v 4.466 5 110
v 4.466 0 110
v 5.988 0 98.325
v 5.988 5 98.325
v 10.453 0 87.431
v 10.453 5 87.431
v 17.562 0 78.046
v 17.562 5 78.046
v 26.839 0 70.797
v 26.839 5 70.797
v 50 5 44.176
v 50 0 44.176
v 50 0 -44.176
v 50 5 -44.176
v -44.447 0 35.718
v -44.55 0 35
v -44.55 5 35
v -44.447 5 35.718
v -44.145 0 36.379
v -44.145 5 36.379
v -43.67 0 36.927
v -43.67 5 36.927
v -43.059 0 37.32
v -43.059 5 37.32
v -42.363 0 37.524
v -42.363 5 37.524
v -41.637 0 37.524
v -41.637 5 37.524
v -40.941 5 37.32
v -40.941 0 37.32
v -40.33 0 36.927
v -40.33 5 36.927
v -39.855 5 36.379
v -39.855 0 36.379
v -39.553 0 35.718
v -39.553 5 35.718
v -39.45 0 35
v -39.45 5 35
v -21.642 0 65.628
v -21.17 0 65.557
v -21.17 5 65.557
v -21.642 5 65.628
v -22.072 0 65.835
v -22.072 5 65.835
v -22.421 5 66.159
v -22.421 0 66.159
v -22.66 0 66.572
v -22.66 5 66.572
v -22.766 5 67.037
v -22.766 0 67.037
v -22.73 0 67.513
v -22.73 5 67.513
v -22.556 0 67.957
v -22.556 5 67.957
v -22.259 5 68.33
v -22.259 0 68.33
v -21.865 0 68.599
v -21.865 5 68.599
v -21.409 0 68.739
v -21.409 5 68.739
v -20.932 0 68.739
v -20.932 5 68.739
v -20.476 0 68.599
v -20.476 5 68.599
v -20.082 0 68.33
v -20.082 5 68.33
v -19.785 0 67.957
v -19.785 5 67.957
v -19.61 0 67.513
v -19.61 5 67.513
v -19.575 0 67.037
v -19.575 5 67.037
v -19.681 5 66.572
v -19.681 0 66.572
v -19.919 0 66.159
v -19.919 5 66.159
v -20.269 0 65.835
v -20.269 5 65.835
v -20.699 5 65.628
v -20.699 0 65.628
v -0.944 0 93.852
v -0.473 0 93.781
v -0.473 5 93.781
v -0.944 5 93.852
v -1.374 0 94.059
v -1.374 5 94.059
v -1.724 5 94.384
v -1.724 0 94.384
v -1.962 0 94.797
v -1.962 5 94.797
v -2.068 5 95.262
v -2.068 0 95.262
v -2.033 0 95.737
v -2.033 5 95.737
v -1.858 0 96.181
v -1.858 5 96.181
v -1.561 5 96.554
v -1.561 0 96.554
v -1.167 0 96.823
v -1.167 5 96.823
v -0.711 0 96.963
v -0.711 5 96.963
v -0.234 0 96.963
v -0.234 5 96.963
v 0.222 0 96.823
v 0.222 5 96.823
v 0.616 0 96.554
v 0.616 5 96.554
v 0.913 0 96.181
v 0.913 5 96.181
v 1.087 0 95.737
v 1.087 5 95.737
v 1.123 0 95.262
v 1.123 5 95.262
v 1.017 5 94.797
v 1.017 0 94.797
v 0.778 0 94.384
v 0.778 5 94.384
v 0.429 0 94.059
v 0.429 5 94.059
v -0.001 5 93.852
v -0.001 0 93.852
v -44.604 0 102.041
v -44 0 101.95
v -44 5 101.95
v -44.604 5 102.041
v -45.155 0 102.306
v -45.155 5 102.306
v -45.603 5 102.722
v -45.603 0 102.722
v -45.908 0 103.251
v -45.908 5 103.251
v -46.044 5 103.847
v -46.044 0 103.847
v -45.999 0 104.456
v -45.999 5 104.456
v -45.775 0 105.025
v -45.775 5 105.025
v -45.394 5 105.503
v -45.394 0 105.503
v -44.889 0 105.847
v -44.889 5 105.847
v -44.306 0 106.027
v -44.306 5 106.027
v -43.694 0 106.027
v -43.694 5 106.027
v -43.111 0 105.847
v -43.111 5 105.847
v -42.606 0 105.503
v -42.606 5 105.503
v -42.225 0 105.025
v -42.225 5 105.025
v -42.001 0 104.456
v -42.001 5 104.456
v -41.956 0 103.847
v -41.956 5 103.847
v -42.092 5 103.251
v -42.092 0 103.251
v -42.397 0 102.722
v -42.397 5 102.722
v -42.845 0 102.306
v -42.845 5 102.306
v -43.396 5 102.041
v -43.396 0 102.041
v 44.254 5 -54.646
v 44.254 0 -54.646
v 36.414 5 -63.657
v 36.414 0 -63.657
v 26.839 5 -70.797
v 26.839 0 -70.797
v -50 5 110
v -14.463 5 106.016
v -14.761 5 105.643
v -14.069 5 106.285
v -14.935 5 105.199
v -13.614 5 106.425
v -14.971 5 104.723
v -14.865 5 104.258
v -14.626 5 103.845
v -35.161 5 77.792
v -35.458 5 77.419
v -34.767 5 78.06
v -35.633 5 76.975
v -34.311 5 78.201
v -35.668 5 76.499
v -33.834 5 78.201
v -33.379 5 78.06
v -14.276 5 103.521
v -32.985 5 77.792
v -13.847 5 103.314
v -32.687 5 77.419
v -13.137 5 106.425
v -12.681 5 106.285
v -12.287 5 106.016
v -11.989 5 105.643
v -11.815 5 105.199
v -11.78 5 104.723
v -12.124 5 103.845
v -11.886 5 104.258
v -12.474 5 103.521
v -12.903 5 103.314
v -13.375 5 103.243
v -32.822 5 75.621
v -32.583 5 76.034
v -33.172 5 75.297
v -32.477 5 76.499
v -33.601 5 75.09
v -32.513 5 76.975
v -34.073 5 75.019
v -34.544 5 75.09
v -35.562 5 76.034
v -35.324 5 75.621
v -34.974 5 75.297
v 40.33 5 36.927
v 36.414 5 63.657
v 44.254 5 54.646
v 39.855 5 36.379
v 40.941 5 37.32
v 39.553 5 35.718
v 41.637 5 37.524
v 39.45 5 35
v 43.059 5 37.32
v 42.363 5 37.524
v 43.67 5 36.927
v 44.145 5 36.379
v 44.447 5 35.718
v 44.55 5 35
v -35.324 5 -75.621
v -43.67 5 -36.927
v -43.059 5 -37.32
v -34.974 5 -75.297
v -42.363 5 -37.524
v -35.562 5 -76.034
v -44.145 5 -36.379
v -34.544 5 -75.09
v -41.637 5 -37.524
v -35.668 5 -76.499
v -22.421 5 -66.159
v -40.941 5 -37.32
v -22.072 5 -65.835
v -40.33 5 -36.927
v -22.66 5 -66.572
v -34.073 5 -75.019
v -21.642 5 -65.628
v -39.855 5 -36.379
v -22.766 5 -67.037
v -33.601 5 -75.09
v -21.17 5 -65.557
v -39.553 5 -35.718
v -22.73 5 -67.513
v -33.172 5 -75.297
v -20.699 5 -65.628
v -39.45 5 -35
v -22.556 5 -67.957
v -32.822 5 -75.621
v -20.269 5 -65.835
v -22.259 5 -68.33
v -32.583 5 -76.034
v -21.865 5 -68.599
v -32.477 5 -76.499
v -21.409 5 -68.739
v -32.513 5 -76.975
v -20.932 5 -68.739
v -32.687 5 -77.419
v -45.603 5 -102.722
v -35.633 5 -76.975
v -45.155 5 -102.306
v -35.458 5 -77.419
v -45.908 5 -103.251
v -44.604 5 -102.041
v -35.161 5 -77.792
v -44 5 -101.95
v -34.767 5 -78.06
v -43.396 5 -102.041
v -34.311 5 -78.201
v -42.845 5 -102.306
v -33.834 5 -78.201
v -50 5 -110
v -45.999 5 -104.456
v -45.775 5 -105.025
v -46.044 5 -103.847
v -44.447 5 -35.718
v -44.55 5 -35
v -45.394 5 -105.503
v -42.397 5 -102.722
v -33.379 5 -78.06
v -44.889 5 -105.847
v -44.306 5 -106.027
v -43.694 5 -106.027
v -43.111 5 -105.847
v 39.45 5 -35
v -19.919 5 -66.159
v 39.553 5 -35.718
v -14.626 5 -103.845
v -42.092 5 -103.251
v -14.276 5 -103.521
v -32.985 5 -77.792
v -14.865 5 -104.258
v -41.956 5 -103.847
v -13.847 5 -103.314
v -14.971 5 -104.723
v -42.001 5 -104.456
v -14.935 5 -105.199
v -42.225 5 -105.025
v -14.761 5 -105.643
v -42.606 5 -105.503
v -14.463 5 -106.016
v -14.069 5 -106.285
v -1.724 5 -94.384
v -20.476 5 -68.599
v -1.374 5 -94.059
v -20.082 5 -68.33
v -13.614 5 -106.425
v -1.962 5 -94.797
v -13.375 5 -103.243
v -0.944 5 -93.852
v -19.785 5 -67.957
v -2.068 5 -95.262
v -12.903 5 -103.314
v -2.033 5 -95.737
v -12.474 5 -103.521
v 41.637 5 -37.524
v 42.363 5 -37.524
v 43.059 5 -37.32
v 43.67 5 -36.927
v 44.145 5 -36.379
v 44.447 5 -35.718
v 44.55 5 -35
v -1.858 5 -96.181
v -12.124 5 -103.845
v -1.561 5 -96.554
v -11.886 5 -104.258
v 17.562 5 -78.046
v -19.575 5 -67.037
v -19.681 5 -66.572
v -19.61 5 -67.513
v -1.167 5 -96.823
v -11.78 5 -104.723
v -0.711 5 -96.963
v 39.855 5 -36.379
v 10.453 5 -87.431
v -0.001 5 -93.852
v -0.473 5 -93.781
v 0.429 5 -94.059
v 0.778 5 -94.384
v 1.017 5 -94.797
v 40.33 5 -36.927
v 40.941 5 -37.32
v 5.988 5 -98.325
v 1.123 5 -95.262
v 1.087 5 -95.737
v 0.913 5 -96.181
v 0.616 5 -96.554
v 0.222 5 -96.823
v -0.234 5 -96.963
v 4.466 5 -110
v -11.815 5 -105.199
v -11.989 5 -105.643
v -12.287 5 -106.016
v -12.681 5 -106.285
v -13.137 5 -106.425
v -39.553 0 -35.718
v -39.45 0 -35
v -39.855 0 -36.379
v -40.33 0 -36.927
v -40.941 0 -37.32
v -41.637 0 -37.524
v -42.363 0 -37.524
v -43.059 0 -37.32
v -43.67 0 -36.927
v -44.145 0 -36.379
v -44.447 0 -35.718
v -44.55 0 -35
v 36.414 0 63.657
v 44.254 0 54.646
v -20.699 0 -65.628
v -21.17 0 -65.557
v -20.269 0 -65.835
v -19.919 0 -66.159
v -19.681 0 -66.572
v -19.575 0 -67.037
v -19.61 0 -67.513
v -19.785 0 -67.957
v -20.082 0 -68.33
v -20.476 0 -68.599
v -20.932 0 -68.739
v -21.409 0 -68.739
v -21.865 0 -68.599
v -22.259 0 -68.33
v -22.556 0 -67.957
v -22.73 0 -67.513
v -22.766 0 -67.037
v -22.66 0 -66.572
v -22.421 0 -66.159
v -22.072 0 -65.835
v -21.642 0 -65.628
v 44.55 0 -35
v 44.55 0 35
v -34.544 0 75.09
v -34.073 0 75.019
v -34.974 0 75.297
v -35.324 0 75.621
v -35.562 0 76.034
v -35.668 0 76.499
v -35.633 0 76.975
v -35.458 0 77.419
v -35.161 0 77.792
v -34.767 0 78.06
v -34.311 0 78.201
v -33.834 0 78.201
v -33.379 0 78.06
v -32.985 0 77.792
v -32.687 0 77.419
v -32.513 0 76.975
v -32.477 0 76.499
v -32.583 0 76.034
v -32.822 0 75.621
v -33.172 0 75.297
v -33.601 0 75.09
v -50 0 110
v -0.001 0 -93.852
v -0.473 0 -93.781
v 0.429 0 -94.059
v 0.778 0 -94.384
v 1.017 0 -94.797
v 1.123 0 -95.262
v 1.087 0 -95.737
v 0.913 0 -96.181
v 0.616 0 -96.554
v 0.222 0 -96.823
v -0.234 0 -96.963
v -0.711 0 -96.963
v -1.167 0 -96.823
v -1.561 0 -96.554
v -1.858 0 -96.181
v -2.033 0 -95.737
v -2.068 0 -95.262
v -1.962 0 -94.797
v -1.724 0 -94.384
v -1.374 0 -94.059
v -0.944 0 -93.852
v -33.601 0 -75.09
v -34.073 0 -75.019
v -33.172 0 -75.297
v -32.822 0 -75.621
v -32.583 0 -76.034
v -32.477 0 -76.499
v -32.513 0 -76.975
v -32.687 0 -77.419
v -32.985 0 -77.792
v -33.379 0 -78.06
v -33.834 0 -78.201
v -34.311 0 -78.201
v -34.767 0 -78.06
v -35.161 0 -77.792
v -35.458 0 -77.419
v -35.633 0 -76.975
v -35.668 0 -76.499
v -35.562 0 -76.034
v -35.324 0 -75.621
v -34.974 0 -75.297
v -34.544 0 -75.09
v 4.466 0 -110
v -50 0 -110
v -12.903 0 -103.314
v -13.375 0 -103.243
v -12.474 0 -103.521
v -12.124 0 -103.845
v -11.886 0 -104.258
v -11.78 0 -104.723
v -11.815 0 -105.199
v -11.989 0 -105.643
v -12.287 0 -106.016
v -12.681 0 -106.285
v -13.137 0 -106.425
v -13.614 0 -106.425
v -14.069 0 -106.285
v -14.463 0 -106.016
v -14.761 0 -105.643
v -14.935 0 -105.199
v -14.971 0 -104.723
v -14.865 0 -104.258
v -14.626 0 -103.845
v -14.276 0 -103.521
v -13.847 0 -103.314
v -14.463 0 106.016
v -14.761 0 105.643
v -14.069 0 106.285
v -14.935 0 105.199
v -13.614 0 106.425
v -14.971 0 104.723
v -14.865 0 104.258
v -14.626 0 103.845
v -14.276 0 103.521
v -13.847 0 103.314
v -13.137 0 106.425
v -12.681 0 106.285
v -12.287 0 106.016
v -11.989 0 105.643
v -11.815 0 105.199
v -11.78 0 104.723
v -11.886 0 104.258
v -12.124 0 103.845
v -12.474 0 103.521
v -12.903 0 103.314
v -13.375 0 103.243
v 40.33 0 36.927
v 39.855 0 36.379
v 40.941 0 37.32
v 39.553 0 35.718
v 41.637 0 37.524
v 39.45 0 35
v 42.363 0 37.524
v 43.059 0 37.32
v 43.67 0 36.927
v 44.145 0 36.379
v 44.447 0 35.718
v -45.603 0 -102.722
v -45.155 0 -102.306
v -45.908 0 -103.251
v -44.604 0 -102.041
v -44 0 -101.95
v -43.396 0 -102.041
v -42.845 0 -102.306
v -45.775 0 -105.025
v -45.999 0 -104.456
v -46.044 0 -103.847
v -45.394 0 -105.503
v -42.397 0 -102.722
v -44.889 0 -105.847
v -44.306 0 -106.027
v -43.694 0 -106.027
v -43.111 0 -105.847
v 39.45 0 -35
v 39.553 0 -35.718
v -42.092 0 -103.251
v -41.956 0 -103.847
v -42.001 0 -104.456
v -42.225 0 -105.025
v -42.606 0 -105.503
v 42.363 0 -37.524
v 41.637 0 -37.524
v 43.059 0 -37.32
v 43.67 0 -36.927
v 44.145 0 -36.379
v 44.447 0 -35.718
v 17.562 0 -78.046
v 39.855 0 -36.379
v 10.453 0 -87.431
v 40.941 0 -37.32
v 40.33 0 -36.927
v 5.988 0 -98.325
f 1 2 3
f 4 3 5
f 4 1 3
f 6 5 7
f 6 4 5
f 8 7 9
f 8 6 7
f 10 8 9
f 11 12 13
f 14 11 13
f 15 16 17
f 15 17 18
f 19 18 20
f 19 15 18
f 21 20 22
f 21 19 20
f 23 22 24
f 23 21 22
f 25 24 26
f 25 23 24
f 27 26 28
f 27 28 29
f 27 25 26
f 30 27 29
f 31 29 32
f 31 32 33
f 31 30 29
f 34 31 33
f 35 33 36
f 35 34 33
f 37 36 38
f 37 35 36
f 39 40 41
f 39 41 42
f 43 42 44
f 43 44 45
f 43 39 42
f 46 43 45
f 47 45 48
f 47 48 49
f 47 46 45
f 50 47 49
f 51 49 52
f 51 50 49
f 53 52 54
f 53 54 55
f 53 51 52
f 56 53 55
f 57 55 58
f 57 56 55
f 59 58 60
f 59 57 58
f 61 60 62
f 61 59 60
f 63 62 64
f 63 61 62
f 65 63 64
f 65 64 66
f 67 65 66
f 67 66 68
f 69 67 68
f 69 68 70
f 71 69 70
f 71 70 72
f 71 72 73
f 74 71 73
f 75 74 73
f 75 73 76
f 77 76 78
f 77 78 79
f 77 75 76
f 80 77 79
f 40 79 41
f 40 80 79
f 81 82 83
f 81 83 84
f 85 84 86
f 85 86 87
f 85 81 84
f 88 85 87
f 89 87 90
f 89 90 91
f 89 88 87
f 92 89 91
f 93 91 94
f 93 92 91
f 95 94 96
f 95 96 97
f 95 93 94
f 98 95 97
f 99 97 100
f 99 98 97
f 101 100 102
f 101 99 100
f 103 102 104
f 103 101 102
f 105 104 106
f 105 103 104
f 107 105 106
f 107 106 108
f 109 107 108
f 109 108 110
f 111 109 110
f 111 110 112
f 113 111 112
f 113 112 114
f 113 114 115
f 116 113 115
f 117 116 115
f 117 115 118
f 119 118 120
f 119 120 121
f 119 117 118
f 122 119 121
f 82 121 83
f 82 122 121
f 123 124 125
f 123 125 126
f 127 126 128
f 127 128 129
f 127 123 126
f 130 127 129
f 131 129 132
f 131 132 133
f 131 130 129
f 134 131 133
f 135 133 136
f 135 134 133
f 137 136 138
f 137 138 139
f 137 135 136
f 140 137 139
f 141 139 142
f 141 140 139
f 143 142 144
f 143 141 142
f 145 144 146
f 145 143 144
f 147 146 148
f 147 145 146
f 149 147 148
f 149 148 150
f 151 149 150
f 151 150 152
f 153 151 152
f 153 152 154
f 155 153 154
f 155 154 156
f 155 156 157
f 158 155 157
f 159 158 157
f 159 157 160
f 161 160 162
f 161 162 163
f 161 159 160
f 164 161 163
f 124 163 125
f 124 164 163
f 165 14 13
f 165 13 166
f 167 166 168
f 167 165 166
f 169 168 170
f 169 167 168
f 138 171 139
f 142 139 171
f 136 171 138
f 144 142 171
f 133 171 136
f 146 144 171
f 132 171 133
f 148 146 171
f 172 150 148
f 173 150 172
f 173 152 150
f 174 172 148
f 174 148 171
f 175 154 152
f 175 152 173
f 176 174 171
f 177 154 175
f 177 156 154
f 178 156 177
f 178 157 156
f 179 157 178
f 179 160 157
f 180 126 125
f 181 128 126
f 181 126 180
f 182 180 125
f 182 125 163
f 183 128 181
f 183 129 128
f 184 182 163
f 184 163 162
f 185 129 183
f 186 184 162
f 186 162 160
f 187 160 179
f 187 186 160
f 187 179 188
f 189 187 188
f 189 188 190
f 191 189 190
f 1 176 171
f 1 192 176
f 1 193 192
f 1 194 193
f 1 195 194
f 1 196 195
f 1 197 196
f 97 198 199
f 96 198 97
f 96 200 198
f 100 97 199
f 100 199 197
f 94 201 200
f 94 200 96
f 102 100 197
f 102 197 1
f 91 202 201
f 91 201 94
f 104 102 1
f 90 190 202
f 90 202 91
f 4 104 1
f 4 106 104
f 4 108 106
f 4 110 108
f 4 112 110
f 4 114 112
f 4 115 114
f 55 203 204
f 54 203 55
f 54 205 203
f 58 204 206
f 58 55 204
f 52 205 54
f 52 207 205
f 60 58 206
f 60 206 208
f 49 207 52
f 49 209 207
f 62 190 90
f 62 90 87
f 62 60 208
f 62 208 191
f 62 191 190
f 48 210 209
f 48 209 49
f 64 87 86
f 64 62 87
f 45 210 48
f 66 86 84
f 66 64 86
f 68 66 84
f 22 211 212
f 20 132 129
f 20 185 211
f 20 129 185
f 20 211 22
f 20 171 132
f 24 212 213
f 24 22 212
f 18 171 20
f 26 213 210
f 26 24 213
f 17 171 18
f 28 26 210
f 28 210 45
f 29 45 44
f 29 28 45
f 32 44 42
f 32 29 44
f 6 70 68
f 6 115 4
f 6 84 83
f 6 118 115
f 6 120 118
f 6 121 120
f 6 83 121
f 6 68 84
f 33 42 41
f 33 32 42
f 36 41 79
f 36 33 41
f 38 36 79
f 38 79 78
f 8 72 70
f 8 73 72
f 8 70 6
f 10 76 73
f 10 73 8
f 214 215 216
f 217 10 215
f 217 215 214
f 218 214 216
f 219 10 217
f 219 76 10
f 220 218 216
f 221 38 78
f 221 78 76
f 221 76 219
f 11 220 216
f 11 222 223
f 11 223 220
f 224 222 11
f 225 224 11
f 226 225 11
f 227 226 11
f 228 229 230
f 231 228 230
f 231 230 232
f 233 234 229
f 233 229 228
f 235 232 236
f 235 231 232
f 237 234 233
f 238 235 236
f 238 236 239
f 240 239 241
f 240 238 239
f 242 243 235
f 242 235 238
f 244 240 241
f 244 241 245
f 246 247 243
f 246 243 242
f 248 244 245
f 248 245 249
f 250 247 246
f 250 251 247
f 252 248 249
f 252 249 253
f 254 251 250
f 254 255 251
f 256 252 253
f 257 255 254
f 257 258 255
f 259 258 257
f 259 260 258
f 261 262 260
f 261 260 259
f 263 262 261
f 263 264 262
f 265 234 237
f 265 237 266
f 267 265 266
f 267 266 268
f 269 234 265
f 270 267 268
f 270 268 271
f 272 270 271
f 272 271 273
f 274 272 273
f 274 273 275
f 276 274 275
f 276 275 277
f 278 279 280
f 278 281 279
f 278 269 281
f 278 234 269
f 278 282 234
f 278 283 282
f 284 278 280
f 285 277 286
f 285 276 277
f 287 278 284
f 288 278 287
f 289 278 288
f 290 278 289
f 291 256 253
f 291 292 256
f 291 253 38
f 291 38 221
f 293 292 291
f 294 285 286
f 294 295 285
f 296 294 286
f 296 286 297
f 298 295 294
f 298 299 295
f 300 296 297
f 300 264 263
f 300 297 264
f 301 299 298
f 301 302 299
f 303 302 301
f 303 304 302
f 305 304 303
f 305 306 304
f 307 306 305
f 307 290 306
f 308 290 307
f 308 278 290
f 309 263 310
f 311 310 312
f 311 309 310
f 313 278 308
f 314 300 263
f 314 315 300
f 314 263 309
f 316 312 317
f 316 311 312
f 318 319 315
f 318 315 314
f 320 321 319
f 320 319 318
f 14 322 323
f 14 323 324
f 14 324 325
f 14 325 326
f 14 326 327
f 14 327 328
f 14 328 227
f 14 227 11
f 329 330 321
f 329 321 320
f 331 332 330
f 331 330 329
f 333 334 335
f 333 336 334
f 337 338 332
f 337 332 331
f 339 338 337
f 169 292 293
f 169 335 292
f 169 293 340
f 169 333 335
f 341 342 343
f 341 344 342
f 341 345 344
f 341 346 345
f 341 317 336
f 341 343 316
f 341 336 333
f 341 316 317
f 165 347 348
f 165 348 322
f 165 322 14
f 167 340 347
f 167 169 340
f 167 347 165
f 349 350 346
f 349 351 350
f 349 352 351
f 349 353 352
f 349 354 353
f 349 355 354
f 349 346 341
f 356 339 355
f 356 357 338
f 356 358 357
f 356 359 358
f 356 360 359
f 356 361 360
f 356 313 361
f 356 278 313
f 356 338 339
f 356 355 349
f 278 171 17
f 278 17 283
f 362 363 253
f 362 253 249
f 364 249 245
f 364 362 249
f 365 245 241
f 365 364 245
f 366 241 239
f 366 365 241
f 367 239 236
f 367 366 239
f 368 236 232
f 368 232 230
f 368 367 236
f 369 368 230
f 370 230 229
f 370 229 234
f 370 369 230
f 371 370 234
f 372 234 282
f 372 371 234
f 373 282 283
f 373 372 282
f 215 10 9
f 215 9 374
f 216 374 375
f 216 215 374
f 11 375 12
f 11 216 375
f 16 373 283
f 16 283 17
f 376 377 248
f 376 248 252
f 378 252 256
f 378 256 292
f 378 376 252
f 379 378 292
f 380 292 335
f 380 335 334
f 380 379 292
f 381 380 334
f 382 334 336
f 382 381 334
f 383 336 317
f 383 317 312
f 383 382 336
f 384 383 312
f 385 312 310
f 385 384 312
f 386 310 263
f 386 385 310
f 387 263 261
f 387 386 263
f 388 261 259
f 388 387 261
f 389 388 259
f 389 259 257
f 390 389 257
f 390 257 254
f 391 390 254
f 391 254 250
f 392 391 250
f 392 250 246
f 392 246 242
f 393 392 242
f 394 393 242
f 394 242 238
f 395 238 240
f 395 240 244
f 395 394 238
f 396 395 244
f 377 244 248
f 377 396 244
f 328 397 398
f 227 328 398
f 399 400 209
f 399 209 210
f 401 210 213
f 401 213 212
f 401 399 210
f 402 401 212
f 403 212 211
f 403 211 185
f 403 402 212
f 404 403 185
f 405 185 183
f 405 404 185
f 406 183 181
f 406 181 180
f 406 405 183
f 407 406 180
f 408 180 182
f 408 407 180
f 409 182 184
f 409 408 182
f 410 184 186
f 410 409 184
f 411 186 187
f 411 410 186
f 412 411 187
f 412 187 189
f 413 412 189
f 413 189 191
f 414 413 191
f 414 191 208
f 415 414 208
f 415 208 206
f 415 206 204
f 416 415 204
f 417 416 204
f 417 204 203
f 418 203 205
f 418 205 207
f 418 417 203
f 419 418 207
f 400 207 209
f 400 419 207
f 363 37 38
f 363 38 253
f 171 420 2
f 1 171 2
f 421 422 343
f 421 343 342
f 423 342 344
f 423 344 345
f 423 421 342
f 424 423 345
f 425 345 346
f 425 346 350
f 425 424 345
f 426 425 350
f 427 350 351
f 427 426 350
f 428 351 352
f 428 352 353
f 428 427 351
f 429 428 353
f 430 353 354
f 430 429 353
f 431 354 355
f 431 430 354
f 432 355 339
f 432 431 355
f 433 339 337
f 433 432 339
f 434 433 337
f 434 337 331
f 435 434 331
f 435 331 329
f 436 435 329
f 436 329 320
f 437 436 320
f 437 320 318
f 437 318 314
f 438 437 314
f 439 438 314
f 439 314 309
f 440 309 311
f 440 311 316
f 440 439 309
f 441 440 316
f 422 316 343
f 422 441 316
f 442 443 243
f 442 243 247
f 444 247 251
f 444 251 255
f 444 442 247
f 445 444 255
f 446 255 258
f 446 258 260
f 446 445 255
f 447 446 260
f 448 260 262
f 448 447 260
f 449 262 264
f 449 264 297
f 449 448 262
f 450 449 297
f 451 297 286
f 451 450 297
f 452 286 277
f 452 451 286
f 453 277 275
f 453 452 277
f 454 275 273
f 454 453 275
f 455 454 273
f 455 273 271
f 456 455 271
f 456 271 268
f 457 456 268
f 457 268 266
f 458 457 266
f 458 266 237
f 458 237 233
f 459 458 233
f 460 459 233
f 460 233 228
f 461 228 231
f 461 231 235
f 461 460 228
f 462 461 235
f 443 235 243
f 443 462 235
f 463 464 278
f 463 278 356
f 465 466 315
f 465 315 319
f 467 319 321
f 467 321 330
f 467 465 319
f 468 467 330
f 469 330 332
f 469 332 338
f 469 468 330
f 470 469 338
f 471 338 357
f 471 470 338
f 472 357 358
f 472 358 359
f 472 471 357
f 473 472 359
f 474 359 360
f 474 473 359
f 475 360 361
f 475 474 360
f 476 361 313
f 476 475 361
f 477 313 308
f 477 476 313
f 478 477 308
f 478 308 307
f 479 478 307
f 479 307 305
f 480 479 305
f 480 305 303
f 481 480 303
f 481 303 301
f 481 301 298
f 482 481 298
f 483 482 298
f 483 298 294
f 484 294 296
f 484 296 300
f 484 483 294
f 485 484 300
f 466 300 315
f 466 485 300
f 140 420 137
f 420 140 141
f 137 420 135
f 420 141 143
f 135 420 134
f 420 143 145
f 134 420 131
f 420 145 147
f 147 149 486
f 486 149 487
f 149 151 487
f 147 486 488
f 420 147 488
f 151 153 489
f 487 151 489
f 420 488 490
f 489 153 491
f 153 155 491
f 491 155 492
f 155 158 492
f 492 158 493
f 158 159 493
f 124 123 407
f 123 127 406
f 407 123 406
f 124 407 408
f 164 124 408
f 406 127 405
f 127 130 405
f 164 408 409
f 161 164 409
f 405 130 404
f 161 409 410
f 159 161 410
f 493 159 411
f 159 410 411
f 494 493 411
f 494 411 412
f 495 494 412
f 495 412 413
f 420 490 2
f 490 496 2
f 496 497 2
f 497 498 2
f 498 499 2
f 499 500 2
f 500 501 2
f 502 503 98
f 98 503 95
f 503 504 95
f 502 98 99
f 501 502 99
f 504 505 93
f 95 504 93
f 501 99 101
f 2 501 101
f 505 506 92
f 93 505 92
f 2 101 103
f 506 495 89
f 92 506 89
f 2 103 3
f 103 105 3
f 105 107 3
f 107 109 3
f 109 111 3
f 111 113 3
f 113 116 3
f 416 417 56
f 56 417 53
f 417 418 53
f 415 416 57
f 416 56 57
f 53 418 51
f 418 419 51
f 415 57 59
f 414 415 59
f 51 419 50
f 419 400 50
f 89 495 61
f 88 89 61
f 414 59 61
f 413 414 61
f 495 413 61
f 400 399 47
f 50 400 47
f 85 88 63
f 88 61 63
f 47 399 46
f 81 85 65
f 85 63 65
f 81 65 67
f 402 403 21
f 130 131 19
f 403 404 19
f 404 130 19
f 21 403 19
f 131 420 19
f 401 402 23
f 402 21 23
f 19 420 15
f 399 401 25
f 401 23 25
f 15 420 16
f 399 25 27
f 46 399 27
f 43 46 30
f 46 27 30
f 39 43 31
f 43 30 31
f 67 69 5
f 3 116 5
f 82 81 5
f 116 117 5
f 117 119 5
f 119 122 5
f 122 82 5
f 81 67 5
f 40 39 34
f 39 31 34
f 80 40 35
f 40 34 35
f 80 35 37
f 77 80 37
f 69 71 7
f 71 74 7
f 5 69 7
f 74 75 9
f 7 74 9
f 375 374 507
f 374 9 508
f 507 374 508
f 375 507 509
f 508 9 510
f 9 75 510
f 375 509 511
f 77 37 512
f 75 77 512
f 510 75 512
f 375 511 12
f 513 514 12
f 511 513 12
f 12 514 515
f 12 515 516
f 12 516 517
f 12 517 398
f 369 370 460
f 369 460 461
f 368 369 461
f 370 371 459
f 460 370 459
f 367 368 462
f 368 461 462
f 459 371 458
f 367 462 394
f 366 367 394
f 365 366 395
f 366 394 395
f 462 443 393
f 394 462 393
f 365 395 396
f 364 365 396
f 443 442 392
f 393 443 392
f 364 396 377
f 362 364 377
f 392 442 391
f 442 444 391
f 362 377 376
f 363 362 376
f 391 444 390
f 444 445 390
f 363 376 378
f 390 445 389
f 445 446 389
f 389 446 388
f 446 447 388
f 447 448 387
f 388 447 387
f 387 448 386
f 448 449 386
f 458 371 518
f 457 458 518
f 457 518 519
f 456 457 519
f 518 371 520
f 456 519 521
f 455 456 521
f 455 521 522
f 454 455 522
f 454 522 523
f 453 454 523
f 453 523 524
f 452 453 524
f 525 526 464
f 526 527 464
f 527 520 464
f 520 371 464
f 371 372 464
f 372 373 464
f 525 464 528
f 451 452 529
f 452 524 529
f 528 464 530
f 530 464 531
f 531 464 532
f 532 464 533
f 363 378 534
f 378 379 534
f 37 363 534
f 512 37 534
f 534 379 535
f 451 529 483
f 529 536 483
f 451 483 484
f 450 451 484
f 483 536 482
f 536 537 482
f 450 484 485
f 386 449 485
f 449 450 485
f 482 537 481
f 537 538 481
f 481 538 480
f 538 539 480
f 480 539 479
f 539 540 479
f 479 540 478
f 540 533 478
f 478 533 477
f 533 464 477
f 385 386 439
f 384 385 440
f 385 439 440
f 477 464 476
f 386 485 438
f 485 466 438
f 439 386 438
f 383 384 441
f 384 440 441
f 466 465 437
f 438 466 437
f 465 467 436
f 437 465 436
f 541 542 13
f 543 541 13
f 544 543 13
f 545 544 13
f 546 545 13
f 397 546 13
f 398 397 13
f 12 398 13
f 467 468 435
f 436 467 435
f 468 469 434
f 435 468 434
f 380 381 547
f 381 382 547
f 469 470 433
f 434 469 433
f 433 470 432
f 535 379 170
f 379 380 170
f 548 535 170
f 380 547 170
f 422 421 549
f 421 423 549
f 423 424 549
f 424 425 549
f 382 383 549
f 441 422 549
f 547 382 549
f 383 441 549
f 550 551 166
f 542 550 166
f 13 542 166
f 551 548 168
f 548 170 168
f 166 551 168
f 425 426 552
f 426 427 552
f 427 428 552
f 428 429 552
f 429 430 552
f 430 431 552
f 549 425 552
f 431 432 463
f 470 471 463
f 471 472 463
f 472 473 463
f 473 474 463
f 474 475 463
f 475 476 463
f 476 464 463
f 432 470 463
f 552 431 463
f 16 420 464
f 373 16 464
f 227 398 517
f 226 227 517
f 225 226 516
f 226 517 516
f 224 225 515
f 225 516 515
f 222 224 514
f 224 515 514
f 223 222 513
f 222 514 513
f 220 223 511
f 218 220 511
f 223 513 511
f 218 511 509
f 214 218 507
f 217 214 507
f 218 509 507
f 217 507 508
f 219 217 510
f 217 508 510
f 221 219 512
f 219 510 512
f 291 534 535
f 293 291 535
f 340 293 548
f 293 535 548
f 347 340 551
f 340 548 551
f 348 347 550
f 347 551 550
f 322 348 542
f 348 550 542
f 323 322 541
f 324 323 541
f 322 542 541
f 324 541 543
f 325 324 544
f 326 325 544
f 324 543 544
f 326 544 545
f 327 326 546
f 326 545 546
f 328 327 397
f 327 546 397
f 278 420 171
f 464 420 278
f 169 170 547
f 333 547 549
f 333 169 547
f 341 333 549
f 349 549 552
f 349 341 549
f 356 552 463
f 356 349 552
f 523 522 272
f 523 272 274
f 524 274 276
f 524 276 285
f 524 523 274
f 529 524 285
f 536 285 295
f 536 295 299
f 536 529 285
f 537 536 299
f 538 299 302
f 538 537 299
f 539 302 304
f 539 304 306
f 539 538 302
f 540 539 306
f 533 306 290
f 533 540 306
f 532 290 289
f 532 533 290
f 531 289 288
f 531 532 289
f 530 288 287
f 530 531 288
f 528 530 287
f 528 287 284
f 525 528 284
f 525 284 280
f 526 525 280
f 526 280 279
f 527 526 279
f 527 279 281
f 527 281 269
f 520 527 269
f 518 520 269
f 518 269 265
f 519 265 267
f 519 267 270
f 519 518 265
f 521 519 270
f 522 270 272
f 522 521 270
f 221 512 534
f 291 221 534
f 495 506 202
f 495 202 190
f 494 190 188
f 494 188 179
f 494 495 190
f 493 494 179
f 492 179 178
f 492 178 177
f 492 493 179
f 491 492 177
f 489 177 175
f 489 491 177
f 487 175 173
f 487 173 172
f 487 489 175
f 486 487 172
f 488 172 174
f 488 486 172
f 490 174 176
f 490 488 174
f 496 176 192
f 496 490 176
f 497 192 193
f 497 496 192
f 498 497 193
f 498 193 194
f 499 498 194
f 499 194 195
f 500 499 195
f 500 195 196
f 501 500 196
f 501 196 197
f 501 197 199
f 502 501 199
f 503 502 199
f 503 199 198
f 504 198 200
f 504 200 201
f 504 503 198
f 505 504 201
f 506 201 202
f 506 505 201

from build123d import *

# Parameters (mm, degrees)
SKETCH1_W           = 100
SKETCH1_H           = 220
SKETCH1_R           = 2.05
SKETCH1_R_2         = 1.6
BOSS_EXTRUDE1_DEPTH = 5
CUT_EXTRUDE1_DEPTH  = 10


with BuildPart() as part:
    # Sketch1 → Boss-Extrude1 (new body)
    with BuildSketch(Plane(origin=(0, 0, 0), x_dir=(1, 0, 0), z_dir=(0, 1, 0))):
        Rectangle(SKETCH1_W, SKETCH1_H)
        with Locations(Location((-44, 104, 0), (0, 0, 270))):
            Circle(SKETCH1_R, mode=Mode.SUBTRACT)
        with Locations(Location((-34.072831353, 76.618821882, 0), (0, 0, 270))):
            Circle(SKETCH1_R_2, mode=Mode.SUBTRACT)
        with Locations(Location((-0.472623192, 95.381178118, 0), (0, 0, 270))):
            Circle(SKETCH1_R_2, mode=Mode.SUBTRACT)
        with Locations(Location((-21.170351419, 67.157003264, 0), (0, 0, 270))):
            Circle(SKETCH1_R_2, mode=Mode.SUBTRACT)
        with Locations(Location((-13.375103126, 104.842996736, 0), (0, 0, 270))):
            Circle(SKETCH1_R_2, mode=Mode.SUBTRACT)
        with Locations(Location((-0.472623192, -95.381178118, 0), (0, 0, 90))):
            Circle(SKETCH1_R_2, mode=Mode.SUBTRACT)
        with Locations(Location((-21.170351419, -67.157003264, 0), (0, 0, 90))):
            Circle(SKETCH1_R_2, mode=Mode.SUBTRACT)
        with Locations(Location((-34.072831353, -76.618821882, 0), (0, 0, 90))):
            Circle(SKETCH1_R_2, mode=Mode.SUBTRACT)
        with Locations(Location((-44, -104, 0), (0, 0, 90))):
            Circle(SKETCH1_R, mode=Mode.SUBTRACT)
        with Locations(Location((-13.375103126, -104.842996736, 0), (0, 0, 90))):
            Circle(SKETCH1_R_2, mode=Mode.SUBTRACT)
        with BuildLine():
            Line((39.45, -35), (39.45, 35))
            ThreePointArc((39.45, 35), (42, 37.55), (44.55, 35))
            Line((44.55, 35), (44.55, -35))
            ThreePointArc((44.55, -35), (42, -37.55), (39.45, -35))
        make_face(mode=Mode.SUBTRACT)
        with BuildLine():
            Line((-39.45, -35), (-39.45, 35))
            ThreePointArc((-39.45, 35), (-42, 37.55), (-44.55, 35))
            Line((-44.55, 35), (-44.55, -35))
            ThreePointArc((-44.55, -35), (-42, -37.55), (-39.45, -35))
        make_face(mode=Mode.SUBTRACT)
    extrude(amount=BOSS_EXTRUDE1_DEPTH)

    # Sketch2 → Cut-Extrude1 (cut)
    with BuildSketch(Plane(origin=(0, 5, 0), x_dir=(1, 0, 0), z_dir=(0, 1, 0))):
        with BuildLine():
            Line((4.46621247, 110), (50, 110))
            Line((50, 110), (50, 44.175543471))
            ThreePointArc((50, 44.175543471), (40.575458137, 59.361991758), (26.838854749, 70.796847608))
            ThreePointArc((26.838854749, 70.796847608), (10.452936433, 87.431092849), (4.46621247, 110))
        make_face()
        with BuildLine():
            Line((50, -44.175543471), (50, -110))
            Line((50, -110), (4.46621247, -110))
            ThreePointArc((4.46621247, -110), (10.452936433, -87.431092849), (26.838854749, -70.796847608))
            ThreePointArc((26.838854749, -70.796847608), (40.575458137, -59.361991758), (50, -44.175543471))
        make_face()
    extrude(amount=-CUT_EXTRUDE1_DEPTH, mode=Mode.SUBTRACT)


solid = part.part
